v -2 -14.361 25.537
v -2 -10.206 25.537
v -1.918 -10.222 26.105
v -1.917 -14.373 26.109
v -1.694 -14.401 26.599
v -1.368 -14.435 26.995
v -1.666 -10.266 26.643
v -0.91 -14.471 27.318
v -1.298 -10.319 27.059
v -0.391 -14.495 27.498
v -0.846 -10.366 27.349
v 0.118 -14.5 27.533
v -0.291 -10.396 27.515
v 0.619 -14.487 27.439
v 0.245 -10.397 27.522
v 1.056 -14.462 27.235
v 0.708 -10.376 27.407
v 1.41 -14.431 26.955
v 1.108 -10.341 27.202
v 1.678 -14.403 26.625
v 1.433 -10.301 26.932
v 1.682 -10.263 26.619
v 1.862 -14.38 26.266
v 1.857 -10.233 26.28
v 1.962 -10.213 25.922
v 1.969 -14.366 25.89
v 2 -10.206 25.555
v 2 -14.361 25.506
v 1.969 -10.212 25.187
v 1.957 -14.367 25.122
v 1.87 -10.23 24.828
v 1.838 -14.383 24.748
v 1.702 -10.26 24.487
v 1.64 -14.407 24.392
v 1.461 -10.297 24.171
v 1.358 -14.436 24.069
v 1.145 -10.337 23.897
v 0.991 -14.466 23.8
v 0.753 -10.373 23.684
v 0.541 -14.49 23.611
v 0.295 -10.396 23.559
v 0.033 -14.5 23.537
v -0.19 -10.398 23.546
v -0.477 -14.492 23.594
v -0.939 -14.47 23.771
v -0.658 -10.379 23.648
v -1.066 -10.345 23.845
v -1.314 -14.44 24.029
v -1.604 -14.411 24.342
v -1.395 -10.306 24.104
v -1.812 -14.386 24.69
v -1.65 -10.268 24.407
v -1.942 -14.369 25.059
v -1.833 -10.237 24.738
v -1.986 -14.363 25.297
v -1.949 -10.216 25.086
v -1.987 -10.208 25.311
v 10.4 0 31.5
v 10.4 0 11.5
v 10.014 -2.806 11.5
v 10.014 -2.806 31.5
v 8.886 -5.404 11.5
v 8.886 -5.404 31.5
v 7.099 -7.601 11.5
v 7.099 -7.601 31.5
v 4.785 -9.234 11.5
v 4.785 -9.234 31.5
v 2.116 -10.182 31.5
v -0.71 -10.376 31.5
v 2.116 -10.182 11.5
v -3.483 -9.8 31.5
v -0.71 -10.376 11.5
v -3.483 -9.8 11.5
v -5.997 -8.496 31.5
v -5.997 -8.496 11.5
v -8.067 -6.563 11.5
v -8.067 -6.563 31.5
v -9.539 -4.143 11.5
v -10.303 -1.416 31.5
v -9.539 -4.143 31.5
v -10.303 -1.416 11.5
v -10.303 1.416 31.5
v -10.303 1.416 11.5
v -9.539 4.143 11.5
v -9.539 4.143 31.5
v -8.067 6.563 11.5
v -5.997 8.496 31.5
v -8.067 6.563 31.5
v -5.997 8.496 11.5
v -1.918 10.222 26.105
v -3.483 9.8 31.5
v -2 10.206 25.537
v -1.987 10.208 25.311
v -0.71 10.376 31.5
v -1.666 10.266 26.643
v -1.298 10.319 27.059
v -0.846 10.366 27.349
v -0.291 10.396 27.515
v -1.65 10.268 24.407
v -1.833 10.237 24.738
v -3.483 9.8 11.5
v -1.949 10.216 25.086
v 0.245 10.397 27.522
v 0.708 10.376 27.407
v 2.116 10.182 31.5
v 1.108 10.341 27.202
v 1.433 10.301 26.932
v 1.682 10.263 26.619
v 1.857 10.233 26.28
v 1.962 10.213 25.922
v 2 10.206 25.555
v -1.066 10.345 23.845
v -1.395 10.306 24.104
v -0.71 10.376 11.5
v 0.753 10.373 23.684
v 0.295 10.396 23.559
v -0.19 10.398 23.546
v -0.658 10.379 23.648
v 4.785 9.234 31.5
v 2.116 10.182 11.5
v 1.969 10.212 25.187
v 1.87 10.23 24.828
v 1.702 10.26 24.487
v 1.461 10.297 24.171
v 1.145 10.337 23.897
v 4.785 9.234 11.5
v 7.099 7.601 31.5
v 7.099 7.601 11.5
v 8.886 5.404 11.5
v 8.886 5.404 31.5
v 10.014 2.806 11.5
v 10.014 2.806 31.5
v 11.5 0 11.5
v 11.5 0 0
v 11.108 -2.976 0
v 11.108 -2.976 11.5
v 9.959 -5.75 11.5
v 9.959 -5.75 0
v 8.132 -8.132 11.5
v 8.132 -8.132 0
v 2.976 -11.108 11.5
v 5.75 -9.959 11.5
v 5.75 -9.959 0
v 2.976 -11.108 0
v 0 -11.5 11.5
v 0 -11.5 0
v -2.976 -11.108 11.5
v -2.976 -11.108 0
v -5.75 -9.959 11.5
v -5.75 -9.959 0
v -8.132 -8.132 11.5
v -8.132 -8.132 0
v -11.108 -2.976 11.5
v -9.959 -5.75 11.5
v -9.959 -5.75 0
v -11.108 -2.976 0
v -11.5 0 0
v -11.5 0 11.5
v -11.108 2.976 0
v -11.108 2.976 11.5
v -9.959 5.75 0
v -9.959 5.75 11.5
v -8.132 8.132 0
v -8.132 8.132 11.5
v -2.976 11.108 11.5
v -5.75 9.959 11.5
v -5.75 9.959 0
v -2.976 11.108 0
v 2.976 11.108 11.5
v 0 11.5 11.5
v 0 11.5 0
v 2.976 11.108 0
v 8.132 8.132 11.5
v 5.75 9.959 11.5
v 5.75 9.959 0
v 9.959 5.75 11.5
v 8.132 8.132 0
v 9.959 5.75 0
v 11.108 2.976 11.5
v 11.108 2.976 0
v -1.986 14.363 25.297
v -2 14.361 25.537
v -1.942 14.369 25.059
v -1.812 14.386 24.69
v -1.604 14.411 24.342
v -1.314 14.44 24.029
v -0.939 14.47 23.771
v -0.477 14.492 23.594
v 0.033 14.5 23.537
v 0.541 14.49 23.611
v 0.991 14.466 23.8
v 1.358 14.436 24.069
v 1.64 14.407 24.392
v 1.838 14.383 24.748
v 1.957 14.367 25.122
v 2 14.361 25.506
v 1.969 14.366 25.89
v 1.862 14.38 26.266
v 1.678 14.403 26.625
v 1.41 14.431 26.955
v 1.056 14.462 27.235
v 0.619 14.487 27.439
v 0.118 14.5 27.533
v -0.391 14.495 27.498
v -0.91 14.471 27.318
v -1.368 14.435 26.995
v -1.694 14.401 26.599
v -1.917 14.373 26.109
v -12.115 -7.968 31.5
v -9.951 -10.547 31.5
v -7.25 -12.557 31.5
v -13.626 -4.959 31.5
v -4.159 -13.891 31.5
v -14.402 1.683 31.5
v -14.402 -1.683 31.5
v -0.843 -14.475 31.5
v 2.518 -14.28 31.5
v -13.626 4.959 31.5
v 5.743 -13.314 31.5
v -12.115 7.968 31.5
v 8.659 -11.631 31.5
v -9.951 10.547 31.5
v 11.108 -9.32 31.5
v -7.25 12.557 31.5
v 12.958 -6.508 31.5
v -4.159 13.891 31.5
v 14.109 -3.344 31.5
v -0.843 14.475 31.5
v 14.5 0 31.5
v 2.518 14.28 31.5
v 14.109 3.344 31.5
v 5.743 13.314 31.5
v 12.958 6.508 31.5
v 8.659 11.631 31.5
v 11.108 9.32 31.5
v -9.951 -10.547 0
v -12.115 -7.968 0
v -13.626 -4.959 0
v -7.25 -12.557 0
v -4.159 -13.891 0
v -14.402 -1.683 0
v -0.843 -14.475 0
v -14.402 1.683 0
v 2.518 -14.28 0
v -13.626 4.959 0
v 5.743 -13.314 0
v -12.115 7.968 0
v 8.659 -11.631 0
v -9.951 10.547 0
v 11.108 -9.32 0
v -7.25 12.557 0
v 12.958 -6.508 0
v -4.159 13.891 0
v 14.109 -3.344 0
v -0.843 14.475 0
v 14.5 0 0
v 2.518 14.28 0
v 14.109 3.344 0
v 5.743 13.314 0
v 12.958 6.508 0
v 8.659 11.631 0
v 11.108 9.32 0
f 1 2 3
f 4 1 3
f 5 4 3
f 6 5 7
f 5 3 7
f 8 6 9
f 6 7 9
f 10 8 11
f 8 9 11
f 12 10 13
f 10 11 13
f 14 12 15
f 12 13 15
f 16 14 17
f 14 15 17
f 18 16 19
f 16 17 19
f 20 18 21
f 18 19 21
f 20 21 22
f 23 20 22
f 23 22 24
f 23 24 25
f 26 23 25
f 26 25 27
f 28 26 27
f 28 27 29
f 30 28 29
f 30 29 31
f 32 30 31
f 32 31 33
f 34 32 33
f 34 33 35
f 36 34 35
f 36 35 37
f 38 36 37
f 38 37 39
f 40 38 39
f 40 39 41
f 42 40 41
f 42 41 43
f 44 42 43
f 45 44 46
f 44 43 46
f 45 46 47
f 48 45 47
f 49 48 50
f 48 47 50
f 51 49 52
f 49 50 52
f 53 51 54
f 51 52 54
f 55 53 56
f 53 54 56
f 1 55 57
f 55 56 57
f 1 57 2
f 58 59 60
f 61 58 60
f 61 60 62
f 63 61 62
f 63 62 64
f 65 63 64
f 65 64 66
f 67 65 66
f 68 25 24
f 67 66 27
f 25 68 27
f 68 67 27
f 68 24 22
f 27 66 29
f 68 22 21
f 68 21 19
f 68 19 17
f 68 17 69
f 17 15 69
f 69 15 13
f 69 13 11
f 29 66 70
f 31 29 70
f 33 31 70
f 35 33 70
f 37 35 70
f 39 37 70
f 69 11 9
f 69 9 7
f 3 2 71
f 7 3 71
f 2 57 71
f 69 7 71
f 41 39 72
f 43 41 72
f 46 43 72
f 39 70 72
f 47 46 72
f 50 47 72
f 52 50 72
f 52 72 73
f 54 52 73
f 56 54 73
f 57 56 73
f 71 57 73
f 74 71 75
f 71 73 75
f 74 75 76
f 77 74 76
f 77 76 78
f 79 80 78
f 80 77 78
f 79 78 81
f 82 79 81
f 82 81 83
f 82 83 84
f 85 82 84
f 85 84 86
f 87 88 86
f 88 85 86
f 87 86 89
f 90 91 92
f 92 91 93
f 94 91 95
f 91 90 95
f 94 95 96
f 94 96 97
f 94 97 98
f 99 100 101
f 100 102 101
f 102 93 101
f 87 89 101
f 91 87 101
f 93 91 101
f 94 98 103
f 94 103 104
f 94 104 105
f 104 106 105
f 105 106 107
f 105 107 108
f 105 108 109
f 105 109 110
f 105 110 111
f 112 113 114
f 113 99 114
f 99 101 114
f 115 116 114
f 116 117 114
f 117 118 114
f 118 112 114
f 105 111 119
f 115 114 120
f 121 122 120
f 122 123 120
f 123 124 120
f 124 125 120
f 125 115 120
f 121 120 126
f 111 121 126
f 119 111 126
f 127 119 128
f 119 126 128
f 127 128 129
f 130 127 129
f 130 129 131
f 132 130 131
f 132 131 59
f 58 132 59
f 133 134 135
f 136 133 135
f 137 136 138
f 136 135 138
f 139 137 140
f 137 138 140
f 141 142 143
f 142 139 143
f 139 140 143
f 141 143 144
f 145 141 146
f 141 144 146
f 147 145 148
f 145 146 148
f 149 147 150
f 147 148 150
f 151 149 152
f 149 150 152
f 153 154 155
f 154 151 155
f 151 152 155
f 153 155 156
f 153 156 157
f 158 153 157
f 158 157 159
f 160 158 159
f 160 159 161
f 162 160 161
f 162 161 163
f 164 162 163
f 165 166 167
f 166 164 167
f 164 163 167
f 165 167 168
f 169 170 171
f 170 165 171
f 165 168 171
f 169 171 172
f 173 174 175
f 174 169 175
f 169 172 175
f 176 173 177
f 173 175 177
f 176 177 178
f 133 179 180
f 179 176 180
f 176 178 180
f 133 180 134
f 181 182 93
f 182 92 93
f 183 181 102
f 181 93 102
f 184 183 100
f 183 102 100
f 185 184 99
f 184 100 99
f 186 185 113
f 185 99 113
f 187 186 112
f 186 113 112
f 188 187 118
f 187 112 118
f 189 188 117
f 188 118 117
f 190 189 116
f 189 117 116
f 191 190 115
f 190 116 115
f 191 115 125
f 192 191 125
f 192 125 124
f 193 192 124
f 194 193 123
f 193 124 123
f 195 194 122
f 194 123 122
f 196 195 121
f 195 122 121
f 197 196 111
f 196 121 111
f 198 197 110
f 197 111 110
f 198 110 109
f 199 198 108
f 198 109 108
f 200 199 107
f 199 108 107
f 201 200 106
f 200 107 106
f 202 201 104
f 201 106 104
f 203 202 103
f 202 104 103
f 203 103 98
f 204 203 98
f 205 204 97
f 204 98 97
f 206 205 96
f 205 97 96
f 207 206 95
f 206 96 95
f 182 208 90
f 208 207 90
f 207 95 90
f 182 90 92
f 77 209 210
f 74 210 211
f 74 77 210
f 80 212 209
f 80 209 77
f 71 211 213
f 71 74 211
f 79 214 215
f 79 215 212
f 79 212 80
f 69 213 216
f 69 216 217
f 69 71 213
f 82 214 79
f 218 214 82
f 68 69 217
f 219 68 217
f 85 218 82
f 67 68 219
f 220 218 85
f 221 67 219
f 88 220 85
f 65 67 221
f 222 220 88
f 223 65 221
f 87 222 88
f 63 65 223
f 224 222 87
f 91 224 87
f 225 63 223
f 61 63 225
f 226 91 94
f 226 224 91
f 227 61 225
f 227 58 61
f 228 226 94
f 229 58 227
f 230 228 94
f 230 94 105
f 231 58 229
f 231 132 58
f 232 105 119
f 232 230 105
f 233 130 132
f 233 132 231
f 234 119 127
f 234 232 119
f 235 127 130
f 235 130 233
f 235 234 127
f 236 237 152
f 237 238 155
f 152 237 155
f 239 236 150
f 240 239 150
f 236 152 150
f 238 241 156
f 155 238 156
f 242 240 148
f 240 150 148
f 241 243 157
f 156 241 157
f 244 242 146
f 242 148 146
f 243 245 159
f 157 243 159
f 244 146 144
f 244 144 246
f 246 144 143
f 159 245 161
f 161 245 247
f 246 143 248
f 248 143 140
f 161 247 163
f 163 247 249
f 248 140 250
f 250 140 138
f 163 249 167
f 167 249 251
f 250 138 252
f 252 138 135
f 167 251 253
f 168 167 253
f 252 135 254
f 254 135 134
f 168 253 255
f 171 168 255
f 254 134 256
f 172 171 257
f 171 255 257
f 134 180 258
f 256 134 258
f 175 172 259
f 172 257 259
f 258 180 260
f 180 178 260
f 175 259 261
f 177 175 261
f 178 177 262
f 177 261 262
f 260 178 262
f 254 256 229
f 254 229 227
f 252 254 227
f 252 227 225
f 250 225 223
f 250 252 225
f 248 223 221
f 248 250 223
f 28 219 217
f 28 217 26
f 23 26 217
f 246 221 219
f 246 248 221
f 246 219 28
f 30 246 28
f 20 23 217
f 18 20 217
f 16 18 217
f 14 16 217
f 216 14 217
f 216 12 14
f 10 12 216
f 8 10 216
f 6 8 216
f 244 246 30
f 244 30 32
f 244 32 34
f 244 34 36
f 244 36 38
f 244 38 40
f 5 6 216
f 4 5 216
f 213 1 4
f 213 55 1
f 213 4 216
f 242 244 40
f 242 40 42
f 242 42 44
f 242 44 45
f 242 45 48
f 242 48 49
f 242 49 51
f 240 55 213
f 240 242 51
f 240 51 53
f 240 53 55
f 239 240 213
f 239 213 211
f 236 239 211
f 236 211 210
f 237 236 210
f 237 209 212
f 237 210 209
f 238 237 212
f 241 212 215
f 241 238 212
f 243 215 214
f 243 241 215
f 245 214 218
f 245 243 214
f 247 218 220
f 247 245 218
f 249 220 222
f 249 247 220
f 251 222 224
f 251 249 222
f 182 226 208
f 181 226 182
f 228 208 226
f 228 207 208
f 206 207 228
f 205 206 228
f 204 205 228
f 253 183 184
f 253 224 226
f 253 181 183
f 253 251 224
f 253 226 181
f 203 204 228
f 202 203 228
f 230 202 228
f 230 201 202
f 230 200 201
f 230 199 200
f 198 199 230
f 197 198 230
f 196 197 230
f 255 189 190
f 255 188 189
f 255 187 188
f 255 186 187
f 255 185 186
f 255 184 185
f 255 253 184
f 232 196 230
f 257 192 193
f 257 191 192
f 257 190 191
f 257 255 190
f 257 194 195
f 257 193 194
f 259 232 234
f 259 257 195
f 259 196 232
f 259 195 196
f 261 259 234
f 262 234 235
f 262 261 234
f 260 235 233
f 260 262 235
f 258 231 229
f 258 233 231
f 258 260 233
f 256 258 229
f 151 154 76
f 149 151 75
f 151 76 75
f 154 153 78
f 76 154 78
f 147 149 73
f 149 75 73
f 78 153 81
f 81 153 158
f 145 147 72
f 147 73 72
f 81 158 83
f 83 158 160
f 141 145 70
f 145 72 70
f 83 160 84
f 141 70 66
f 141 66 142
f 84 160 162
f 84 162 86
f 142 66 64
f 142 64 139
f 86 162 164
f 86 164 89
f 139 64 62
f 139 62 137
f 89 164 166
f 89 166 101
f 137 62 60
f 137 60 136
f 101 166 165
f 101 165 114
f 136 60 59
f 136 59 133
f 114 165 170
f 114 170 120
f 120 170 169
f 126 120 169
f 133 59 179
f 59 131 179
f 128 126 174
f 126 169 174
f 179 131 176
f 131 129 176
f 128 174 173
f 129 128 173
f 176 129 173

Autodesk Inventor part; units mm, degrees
ref_plane "YZ Plane" through (0, 0, 0) normal (1, 0, 0) x (0, 1, 0)
ref_plane "XZ Plane" through (0, 0, 0) normal (0, 1, 0) x (-1, 0, 0)
ref_plane "XY Plane" through (0, 0, 0) normal (0, 0, 1) x (1, 0, 0)
sketch "草图1" plane through (0, 0, 0) normal (0, 0, 1) x (1, 0, 0)
  circle A0 centre (0, 0) radius 11.5
  circle A1 centre (0, 0) radius 14.5
  dimension "d0" = 23
  dimension "d1" = 3
extrude "拉伸1" add sketch "草图1" along normal blind 11.5
sketch "草图2" plane through (0, 0, 11.5) normal (0, 0, 1) x (1, 0, 0)
  circle A0 centre (0, 0) radius 10.4
  circle A1 centre (0, 0) radius 14.5 projected
  dimension "d4" = 20.8
extrude "拉伸2" add sketch "草图2" along normal blind 20
sketch "草图3" plane through (0, 0, 0) normal (0, 1, 0) x (-1, 0, 0)
  circle A0 centre (0, 25.5367) radius 2
  point P0 (0, 0)
  dimension "d10" = 4
extrude "拉伸3" cut sketch "草图3" along normal mid plane 37.75
properties part number "卡管1_3D 打印"
